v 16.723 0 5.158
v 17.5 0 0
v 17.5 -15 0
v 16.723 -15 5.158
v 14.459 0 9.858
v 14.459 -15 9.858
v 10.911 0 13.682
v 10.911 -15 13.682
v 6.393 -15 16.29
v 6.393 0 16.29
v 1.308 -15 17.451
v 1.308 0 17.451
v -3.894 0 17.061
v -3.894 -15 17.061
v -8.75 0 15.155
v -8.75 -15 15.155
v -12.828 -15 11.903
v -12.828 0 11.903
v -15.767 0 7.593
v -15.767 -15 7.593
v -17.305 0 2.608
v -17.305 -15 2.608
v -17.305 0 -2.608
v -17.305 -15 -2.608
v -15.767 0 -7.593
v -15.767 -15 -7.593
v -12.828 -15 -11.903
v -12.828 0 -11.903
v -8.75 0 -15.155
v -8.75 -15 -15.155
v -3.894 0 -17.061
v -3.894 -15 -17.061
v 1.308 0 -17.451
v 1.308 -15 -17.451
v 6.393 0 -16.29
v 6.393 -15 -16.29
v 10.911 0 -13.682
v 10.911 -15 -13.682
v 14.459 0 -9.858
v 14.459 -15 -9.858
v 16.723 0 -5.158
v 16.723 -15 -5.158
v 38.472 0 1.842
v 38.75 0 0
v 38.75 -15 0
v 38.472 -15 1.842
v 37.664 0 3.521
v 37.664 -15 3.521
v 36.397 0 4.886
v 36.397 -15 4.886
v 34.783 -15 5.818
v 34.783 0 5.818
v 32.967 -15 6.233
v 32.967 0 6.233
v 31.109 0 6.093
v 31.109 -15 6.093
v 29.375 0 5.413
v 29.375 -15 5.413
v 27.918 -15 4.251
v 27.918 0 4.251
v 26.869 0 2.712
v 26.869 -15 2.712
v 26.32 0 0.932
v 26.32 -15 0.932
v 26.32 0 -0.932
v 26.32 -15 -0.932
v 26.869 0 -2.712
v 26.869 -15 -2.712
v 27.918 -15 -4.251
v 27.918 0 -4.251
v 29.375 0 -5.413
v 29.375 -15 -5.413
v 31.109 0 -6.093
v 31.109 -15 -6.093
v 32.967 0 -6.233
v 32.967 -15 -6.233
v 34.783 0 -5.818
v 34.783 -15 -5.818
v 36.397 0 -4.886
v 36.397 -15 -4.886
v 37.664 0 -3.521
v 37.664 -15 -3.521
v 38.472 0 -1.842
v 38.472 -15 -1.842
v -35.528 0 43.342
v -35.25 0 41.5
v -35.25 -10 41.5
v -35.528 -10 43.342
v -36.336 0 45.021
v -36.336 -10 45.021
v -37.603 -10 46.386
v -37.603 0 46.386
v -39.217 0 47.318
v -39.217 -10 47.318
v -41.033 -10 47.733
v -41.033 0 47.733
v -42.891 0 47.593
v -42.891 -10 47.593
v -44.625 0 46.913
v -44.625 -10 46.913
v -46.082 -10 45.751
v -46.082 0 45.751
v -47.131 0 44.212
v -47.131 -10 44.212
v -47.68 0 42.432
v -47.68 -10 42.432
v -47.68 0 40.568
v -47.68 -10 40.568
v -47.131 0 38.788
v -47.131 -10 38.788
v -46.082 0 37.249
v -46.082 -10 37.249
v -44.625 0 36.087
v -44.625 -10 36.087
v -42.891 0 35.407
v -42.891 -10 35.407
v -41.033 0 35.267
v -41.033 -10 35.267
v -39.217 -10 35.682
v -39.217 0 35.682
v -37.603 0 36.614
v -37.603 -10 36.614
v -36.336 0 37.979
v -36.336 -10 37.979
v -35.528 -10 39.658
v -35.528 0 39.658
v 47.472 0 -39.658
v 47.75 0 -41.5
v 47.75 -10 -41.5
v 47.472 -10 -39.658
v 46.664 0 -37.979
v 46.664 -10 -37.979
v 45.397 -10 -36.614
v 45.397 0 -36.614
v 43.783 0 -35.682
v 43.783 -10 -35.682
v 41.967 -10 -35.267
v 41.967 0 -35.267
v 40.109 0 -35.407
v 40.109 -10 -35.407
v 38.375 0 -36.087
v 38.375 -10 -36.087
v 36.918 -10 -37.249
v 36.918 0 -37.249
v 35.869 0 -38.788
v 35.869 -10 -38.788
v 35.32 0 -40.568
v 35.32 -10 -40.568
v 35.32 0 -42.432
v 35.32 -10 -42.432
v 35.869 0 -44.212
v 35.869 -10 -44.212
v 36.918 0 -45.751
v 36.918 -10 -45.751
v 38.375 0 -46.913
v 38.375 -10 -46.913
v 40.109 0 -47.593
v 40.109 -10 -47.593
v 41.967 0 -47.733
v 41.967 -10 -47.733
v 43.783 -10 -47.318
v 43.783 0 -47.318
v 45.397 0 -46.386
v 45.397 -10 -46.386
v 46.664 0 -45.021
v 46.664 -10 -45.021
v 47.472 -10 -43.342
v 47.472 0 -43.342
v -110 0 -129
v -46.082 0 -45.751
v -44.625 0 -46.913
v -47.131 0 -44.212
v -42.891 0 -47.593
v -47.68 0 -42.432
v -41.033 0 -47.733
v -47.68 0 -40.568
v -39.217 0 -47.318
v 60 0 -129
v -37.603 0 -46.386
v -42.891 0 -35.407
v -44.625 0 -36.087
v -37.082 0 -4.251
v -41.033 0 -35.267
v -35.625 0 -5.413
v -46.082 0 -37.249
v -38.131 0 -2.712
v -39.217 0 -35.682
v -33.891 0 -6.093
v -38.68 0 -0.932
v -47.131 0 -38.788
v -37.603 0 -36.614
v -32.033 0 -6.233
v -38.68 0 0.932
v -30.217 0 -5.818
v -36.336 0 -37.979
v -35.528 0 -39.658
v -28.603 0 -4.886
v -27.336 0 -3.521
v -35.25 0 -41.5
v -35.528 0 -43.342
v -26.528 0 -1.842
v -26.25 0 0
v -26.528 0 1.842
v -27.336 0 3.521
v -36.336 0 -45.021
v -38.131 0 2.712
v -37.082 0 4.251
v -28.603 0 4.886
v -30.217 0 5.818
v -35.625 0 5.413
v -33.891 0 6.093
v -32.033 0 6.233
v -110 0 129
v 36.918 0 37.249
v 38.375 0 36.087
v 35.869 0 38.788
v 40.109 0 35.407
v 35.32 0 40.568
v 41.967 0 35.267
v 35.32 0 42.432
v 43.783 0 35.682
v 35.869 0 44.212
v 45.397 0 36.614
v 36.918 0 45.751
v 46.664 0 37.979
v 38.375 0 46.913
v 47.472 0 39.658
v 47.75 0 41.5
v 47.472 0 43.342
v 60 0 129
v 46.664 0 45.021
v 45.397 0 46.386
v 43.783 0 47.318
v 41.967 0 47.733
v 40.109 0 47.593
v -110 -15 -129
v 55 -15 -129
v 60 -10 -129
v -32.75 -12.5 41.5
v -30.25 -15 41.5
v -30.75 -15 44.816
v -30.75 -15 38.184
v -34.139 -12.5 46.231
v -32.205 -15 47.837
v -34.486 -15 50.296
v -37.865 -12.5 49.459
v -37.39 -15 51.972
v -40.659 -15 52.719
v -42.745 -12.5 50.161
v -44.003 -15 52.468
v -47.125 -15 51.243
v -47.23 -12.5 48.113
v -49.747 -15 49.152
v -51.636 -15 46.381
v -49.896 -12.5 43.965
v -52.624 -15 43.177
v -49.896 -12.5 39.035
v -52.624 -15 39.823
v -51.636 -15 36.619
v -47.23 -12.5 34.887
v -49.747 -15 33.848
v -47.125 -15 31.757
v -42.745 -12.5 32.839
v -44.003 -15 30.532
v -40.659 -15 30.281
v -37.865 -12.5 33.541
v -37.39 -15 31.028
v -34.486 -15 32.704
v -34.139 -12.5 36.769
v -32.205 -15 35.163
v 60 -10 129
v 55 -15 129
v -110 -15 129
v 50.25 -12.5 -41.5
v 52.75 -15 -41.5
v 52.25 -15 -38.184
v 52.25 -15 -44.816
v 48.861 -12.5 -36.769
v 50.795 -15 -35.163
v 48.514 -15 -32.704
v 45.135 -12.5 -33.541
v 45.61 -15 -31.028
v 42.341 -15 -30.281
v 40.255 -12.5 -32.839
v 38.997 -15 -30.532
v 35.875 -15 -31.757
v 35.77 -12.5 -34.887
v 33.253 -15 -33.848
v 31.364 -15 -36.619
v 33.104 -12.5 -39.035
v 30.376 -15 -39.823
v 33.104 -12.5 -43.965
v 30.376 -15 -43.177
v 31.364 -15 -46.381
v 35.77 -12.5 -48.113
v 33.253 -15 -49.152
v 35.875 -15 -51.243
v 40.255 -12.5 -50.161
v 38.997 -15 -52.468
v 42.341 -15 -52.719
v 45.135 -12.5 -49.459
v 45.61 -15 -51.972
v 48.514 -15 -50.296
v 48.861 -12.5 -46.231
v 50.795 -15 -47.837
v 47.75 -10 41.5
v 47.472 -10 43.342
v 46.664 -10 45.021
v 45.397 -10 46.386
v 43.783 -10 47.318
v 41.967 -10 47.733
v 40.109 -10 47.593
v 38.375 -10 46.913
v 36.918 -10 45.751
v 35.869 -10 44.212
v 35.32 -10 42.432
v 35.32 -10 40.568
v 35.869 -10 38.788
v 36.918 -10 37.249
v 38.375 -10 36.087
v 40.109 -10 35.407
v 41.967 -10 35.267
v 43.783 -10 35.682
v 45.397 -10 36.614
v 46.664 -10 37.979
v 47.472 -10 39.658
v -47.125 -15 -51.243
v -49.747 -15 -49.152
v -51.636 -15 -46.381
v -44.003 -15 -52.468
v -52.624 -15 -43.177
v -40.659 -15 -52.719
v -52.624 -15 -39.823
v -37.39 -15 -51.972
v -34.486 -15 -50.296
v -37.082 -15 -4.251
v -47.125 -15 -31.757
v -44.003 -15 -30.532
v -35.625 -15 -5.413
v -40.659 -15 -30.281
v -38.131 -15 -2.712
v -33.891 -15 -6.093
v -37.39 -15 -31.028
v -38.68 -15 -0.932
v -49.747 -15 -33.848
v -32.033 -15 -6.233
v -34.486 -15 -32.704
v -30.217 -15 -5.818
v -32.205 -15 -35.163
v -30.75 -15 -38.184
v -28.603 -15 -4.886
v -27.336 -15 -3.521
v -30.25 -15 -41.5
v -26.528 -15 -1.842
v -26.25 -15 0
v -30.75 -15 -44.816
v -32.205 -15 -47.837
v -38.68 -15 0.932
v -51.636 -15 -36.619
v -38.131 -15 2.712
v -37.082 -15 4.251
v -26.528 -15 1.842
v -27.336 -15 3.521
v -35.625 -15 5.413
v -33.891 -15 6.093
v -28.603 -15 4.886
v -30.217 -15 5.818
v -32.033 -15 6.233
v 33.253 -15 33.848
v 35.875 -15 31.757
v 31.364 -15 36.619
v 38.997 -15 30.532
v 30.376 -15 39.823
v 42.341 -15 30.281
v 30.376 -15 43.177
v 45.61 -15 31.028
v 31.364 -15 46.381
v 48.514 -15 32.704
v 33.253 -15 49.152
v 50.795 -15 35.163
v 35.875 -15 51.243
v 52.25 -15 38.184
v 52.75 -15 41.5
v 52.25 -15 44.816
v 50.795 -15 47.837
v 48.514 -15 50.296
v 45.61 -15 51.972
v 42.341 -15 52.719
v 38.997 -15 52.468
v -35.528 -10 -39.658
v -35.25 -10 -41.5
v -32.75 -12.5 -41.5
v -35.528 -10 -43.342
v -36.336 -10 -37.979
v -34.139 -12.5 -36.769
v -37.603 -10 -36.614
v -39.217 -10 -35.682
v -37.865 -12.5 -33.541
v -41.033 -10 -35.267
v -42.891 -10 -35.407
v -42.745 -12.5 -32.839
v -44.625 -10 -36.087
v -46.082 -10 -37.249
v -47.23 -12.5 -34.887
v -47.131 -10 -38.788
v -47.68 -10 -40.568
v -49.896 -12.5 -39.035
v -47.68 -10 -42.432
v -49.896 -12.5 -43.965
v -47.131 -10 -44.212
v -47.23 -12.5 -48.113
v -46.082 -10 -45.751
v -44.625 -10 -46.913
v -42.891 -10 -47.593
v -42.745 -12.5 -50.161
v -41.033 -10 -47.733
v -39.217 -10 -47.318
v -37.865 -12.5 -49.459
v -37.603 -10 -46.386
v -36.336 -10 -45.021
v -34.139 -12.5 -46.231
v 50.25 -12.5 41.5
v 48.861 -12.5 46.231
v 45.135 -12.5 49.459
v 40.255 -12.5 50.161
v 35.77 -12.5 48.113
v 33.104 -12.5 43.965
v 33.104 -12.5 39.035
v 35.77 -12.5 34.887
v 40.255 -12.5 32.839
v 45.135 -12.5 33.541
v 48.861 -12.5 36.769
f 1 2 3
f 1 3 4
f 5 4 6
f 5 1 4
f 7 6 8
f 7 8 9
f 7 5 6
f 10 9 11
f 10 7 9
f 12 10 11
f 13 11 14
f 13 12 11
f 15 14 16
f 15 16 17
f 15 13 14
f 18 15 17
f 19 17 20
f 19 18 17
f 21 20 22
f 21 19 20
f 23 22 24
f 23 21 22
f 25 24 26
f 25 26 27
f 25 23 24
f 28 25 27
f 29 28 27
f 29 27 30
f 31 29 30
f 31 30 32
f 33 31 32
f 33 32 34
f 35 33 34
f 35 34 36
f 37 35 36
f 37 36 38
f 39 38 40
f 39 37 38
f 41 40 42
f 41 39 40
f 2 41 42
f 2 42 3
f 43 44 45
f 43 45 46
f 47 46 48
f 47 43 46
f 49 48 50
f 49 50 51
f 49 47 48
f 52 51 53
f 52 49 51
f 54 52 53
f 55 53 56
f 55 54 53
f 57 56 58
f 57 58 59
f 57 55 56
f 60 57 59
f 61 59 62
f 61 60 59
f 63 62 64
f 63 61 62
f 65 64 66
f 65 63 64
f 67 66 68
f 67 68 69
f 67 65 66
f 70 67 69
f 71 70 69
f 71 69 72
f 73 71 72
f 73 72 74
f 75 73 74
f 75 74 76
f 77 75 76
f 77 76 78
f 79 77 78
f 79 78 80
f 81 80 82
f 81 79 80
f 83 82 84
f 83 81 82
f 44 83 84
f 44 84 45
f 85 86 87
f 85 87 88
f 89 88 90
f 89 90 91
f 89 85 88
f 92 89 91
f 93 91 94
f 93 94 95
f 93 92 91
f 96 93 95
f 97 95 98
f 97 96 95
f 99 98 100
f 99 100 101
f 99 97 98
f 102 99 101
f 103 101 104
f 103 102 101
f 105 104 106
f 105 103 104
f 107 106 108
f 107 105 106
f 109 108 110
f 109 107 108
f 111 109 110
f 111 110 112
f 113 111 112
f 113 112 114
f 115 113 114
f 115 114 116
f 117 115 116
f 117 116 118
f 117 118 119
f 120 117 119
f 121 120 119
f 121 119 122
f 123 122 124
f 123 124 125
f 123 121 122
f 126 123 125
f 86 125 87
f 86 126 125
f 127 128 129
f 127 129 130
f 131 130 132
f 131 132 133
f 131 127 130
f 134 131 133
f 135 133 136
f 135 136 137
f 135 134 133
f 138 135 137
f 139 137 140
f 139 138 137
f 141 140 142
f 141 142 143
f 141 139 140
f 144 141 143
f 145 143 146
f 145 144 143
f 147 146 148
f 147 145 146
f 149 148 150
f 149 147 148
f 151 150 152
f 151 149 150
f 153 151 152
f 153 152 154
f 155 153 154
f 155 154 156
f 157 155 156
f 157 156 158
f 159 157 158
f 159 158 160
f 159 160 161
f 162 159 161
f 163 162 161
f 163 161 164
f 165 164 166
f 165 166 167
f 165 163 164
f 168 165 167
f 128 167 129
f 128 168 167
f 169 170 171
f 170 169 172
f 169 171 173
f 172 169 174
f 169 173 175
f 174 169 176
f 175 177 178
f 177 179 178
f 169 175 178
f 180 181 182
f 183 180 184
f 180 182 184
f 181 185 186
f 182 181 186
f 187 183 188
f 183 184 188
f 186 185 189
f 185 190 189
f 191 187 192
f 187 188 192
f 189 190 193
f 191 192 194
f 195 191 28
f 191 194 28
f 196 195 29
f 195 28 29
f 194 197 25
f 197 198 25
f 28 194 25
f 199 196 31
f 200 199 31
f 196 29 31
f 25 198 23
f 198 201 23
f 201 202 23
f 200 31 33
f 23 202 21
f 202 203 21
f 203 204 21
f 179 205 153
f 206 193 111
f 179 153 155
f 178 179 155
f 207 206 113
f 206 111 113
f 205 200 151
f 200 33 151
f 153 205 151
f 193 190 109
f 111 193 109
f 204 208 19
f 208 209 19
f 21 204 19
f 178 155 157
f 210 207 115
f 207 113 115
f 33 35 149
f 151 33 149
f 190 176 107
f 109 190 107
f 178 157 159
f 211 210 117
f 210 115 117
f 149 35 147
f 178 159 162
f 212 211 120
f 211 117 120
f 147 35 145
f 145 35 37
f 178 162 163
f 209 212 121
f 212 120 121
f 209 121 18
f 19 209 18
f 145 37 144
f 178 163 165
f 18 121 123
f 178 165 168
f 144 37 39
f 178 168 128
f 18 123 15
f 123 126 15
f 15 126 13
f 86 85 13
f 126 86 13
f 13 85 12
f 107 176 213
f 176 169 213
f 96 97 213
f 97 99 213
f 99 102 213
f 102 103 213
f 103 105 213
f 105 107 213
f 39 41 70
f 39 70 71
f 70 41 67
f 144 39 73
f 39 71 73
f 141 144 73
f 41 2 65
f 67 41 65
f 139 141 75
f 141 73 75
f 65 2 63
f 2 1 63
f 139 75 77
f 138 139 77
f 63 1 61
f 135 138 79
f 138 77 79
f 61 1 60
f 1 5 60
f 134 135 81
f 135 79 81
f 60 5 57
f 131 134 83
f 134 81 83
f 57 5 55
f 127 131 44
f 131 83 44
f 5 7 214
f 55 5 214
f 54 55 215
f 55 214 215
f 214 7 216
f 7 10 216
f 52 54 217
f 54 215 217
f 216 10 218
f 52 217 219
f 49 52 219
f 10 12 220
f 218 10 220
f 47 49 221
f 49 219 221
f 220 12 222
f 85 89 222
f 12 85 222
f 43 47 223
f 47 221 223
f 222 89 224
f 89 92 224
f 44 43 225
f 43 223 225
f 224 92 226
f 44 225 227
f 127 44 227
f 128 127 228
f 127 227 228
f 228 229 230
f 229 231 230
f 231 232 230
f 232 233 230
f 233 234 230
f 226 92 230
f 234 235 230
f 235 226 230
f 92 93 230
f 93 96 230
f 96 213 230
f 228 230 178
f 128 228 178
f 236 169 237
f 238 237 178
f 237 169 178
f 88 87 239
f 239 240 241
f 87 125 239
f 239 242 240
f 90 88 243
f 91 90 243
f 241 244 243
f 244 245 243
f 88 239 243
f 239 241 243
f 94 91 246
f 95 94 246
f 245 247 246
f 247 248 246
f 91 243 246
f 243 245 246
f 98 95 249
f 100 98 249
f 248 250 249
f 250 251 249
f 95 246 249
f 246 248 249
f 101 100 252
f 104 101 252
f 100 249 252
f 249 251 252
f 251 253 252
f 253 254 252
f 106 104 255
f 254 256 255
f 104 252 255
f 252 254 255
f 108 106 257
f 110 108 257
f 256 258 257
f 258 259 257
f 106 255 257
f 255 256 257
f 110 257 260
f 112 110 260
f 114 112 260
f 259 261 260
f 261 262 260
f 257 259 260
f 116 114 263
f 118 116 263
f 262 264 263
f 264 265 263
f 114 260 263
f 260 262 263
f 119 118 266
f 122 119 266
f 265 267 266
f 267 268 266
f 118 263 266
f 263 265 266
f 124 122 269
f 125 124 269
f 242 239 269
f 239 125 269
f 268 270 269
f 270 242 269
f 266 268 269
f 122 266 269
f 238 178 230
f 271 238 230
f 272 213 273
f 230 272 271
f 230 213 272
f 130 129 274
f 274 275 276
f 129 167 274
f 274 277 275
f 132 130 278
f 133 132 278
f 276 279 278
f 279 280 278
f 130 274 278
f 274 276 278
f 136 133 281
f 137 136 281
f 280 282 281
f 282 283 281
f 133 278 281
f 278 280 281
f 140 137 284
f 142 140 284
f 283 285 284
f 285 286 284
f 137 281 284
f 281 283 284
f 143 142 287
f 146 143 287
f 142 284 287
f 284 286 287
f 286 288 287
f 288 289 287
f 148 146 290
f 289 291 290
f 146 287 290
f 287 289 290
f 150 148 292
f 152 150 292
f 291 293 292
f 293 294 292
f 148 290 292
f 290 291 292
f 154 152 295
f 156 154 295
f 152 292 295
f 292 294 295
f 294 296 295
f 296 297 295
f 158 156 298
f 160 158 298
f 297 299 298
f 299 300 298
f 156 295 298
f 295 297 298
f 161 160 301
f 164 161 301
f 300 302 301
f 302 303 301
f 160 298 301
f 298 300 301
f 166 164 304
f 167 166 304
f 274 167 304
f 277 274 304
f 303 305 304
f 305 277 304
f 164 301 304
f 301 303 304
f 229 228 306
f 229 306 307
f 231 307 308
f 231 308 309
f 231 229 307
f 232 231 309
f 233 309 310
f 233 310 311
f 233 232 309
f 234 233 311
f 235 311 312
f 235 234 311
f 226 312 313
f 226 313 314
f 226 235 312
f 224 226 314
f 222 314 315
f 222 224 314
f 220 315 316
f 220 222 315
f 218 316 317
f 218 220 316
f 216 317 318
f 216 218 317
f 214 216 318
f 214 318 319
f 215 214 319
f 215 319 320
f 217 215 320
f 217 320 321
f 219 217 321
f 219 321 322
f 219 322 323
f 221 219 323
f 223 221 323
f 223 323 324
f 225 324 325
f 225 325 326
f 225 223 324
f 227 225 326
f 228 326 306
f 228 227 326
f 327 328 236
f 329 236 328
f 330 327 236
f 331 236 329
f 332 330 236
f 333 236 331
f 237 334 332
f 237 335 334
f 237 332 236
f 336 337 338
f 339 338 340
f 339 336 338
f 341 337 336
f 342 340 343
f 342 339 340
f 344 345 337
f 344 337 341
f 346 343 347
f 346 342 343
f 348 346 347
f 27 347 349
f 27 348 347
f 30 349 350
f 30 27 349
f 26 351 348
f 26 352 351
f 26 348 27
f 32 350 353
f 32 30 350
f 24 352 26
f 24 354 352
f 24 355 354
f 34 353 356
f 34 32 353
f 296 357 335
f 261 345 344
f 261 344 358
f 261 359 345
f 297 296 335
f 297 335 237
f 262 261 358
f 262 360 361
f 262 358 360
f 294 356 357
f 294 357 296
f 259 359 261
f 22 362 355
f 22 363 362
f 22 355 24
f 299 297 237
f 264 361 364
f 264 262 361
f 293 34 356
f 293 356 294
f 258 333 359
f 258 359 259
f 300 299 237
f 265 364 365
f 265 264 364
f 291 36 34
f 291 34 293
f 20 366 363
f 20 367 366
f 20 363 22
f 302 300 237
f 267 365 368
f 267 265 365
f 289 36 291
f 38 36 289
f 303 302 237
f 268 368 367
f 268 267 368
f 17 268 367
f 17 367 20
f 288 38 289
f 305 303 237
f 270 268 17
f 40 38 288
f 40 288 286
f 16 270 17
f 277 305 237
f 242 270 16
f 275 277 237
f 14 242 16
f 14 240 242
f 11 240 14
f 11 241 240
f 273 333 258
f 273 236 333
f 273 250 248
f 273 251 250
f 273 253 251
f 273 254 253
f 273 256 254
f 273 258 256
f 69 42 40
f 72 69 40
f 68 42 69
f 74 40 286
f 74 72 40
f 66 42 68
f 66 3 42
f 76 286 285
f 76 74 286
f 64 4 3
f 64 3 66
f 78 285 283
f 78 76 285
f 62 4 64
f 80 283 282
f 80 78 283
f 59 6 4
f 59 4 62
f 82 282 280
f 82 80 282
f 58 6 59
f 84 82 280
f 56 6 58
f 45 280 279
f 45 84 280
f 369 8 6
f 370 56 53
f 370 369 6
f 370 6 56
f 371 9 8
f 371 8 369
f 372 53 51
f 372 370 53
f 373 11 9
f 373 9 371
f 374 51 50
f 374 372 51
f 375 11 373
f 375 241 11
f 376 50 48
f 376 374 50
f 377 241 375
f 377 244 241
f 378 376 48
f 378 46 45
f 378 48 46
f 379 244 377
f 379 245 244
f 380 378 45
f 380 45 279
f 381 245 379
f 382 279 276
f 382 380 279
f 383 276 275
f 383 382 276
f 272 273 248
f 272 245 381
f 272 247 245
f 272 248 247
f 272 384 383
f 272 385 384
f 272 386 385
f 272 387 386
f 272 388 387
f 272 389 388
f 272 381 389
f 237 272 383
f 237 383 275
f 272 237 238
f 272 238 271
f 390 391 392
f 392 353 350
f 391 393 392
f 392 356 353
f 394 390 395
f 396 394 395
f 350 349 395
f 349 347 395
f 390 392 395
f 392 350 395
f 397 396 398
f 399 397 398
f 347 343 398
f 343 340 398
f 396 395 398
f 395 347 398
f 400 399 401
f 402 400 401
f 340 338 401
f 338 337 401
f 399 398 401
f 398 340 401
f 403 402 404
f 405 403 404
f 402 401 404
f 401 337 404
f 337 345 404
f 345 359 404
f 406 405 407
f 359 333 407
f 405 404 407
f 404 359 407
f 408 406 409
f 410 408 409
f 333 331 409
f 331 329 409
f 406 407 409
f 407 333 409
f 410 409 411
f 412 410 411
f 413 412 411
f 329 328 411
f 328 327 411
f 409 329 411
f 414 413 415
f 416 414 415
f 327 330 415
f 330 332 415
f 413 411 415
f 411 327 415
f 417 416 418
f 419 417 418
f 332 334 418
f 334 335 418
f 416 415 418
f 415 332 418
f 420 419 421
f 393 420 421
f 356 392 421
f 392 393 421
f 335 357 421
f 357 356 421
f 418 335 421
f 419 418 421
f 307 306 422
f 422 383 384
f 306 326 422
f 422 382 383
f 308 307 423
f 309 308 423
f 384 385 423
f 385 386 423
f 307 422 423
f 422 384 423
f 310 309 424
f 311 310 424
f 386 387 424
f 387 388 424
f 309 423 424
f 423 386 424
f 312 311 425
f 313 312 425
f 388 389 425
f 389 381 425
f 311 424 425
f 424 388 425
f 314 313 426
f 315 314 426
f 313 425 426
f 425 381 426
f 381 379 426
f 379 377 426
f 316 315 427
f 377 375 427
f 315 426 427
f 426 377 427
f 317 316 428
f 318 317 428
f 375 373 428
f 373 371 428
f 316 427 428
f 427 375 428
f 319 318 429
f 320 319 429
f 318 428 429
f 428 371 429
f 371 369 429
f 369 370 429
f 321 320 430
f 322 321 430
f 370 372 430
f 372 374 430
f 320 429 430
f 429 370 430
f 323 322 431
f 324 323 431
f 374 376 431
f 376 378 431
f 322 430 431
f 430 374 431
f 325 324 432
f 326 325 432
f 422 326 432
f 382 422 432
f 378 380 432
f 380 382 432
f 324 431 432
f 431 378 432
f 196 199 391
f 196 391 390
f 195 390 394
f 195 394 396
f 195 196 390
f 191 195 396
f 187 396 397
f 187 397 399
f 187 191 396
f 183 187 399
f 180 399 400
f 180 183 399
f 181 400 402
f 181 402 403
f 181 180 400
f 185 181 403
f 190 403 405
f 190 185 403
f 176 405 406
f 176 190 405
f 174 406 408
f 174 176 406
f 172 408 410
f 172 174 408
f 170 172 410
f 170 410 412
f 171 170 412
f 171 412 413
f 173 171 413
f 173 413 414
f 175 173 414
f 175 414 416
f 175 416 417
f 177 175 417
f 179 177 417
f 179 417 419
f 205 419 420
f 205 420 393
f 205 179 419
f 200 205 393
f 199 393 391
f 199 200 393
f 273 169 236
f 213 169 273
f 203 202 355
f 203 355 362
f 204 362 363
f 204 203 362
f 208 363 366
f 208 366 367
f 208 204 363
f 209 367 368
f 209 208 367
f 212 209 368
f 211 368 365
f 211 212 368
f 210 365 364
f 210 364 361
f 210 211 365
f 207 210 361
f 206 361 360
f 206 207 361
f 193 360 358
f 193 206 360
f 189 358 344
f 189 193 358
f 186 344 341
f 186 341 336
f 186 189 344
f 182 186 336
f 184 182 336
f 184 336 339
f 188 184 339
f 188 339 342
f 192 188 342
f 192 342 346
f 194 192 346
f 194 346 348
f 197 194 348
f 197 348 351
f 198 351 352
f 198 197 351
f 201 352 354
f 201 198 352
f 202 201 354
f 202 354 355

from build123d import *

# Parameters (mm, degrees)
F0_W     = 170
F0_H     = 258
F0_R     = 6.25
F0_R_2   = 17.5
F1_DEPTH = 15
F2_SIZE2 = 5
F2_SIZE  = 5


with BuildPart() as f1:
    # F0 (on Front) → F1 (new body)
    with BuildSketch(Plane.XZ):
        with Locations((-25, 0)):
            Rectangle(F0_W, F0_H)
        with Locations((-41.5, -41.5)):
            Circle(F0_R, mode=Mode.SUBTRACT)
        with Locations((41.5, -41.5)):
            Circle(F0_R, mode=Mode.SUBTRACT)
        with Locations((-32.5, 0)):
            Circle(F0_R, mode=Mode.SUBTRACT)
        with Locations((-41.5, 41.5)):
            Circle(F0_R, mode=Mode.SUBTRACT)
        Circle(F0_R_2, mode=Mode.SUBTRACT)
        with Locations((32.5, 0)):
            Circle(F0_R, mode=Mode.SUBTRACT)
        with Locations((41.5, 41.5)):
            Circle(F0_R, mode=Mode.SUBTRACT)
    extrude(amount=F1_DEPTH)

    # F2
    f2_edges = [f1.edges().sort_by_distance(p)[0] for p in [
        (-47.75, -15, 41.5),
        (35.25, -15, 41.5),
        (-47.75, -15, -41.5),
        (35.25, -15, -41.5),
        (60, -15, 0),
    ]]
    chamfer(f2_edges, length=F2_SIZE, length2=F2_SIZE2)


solid = f1.part
